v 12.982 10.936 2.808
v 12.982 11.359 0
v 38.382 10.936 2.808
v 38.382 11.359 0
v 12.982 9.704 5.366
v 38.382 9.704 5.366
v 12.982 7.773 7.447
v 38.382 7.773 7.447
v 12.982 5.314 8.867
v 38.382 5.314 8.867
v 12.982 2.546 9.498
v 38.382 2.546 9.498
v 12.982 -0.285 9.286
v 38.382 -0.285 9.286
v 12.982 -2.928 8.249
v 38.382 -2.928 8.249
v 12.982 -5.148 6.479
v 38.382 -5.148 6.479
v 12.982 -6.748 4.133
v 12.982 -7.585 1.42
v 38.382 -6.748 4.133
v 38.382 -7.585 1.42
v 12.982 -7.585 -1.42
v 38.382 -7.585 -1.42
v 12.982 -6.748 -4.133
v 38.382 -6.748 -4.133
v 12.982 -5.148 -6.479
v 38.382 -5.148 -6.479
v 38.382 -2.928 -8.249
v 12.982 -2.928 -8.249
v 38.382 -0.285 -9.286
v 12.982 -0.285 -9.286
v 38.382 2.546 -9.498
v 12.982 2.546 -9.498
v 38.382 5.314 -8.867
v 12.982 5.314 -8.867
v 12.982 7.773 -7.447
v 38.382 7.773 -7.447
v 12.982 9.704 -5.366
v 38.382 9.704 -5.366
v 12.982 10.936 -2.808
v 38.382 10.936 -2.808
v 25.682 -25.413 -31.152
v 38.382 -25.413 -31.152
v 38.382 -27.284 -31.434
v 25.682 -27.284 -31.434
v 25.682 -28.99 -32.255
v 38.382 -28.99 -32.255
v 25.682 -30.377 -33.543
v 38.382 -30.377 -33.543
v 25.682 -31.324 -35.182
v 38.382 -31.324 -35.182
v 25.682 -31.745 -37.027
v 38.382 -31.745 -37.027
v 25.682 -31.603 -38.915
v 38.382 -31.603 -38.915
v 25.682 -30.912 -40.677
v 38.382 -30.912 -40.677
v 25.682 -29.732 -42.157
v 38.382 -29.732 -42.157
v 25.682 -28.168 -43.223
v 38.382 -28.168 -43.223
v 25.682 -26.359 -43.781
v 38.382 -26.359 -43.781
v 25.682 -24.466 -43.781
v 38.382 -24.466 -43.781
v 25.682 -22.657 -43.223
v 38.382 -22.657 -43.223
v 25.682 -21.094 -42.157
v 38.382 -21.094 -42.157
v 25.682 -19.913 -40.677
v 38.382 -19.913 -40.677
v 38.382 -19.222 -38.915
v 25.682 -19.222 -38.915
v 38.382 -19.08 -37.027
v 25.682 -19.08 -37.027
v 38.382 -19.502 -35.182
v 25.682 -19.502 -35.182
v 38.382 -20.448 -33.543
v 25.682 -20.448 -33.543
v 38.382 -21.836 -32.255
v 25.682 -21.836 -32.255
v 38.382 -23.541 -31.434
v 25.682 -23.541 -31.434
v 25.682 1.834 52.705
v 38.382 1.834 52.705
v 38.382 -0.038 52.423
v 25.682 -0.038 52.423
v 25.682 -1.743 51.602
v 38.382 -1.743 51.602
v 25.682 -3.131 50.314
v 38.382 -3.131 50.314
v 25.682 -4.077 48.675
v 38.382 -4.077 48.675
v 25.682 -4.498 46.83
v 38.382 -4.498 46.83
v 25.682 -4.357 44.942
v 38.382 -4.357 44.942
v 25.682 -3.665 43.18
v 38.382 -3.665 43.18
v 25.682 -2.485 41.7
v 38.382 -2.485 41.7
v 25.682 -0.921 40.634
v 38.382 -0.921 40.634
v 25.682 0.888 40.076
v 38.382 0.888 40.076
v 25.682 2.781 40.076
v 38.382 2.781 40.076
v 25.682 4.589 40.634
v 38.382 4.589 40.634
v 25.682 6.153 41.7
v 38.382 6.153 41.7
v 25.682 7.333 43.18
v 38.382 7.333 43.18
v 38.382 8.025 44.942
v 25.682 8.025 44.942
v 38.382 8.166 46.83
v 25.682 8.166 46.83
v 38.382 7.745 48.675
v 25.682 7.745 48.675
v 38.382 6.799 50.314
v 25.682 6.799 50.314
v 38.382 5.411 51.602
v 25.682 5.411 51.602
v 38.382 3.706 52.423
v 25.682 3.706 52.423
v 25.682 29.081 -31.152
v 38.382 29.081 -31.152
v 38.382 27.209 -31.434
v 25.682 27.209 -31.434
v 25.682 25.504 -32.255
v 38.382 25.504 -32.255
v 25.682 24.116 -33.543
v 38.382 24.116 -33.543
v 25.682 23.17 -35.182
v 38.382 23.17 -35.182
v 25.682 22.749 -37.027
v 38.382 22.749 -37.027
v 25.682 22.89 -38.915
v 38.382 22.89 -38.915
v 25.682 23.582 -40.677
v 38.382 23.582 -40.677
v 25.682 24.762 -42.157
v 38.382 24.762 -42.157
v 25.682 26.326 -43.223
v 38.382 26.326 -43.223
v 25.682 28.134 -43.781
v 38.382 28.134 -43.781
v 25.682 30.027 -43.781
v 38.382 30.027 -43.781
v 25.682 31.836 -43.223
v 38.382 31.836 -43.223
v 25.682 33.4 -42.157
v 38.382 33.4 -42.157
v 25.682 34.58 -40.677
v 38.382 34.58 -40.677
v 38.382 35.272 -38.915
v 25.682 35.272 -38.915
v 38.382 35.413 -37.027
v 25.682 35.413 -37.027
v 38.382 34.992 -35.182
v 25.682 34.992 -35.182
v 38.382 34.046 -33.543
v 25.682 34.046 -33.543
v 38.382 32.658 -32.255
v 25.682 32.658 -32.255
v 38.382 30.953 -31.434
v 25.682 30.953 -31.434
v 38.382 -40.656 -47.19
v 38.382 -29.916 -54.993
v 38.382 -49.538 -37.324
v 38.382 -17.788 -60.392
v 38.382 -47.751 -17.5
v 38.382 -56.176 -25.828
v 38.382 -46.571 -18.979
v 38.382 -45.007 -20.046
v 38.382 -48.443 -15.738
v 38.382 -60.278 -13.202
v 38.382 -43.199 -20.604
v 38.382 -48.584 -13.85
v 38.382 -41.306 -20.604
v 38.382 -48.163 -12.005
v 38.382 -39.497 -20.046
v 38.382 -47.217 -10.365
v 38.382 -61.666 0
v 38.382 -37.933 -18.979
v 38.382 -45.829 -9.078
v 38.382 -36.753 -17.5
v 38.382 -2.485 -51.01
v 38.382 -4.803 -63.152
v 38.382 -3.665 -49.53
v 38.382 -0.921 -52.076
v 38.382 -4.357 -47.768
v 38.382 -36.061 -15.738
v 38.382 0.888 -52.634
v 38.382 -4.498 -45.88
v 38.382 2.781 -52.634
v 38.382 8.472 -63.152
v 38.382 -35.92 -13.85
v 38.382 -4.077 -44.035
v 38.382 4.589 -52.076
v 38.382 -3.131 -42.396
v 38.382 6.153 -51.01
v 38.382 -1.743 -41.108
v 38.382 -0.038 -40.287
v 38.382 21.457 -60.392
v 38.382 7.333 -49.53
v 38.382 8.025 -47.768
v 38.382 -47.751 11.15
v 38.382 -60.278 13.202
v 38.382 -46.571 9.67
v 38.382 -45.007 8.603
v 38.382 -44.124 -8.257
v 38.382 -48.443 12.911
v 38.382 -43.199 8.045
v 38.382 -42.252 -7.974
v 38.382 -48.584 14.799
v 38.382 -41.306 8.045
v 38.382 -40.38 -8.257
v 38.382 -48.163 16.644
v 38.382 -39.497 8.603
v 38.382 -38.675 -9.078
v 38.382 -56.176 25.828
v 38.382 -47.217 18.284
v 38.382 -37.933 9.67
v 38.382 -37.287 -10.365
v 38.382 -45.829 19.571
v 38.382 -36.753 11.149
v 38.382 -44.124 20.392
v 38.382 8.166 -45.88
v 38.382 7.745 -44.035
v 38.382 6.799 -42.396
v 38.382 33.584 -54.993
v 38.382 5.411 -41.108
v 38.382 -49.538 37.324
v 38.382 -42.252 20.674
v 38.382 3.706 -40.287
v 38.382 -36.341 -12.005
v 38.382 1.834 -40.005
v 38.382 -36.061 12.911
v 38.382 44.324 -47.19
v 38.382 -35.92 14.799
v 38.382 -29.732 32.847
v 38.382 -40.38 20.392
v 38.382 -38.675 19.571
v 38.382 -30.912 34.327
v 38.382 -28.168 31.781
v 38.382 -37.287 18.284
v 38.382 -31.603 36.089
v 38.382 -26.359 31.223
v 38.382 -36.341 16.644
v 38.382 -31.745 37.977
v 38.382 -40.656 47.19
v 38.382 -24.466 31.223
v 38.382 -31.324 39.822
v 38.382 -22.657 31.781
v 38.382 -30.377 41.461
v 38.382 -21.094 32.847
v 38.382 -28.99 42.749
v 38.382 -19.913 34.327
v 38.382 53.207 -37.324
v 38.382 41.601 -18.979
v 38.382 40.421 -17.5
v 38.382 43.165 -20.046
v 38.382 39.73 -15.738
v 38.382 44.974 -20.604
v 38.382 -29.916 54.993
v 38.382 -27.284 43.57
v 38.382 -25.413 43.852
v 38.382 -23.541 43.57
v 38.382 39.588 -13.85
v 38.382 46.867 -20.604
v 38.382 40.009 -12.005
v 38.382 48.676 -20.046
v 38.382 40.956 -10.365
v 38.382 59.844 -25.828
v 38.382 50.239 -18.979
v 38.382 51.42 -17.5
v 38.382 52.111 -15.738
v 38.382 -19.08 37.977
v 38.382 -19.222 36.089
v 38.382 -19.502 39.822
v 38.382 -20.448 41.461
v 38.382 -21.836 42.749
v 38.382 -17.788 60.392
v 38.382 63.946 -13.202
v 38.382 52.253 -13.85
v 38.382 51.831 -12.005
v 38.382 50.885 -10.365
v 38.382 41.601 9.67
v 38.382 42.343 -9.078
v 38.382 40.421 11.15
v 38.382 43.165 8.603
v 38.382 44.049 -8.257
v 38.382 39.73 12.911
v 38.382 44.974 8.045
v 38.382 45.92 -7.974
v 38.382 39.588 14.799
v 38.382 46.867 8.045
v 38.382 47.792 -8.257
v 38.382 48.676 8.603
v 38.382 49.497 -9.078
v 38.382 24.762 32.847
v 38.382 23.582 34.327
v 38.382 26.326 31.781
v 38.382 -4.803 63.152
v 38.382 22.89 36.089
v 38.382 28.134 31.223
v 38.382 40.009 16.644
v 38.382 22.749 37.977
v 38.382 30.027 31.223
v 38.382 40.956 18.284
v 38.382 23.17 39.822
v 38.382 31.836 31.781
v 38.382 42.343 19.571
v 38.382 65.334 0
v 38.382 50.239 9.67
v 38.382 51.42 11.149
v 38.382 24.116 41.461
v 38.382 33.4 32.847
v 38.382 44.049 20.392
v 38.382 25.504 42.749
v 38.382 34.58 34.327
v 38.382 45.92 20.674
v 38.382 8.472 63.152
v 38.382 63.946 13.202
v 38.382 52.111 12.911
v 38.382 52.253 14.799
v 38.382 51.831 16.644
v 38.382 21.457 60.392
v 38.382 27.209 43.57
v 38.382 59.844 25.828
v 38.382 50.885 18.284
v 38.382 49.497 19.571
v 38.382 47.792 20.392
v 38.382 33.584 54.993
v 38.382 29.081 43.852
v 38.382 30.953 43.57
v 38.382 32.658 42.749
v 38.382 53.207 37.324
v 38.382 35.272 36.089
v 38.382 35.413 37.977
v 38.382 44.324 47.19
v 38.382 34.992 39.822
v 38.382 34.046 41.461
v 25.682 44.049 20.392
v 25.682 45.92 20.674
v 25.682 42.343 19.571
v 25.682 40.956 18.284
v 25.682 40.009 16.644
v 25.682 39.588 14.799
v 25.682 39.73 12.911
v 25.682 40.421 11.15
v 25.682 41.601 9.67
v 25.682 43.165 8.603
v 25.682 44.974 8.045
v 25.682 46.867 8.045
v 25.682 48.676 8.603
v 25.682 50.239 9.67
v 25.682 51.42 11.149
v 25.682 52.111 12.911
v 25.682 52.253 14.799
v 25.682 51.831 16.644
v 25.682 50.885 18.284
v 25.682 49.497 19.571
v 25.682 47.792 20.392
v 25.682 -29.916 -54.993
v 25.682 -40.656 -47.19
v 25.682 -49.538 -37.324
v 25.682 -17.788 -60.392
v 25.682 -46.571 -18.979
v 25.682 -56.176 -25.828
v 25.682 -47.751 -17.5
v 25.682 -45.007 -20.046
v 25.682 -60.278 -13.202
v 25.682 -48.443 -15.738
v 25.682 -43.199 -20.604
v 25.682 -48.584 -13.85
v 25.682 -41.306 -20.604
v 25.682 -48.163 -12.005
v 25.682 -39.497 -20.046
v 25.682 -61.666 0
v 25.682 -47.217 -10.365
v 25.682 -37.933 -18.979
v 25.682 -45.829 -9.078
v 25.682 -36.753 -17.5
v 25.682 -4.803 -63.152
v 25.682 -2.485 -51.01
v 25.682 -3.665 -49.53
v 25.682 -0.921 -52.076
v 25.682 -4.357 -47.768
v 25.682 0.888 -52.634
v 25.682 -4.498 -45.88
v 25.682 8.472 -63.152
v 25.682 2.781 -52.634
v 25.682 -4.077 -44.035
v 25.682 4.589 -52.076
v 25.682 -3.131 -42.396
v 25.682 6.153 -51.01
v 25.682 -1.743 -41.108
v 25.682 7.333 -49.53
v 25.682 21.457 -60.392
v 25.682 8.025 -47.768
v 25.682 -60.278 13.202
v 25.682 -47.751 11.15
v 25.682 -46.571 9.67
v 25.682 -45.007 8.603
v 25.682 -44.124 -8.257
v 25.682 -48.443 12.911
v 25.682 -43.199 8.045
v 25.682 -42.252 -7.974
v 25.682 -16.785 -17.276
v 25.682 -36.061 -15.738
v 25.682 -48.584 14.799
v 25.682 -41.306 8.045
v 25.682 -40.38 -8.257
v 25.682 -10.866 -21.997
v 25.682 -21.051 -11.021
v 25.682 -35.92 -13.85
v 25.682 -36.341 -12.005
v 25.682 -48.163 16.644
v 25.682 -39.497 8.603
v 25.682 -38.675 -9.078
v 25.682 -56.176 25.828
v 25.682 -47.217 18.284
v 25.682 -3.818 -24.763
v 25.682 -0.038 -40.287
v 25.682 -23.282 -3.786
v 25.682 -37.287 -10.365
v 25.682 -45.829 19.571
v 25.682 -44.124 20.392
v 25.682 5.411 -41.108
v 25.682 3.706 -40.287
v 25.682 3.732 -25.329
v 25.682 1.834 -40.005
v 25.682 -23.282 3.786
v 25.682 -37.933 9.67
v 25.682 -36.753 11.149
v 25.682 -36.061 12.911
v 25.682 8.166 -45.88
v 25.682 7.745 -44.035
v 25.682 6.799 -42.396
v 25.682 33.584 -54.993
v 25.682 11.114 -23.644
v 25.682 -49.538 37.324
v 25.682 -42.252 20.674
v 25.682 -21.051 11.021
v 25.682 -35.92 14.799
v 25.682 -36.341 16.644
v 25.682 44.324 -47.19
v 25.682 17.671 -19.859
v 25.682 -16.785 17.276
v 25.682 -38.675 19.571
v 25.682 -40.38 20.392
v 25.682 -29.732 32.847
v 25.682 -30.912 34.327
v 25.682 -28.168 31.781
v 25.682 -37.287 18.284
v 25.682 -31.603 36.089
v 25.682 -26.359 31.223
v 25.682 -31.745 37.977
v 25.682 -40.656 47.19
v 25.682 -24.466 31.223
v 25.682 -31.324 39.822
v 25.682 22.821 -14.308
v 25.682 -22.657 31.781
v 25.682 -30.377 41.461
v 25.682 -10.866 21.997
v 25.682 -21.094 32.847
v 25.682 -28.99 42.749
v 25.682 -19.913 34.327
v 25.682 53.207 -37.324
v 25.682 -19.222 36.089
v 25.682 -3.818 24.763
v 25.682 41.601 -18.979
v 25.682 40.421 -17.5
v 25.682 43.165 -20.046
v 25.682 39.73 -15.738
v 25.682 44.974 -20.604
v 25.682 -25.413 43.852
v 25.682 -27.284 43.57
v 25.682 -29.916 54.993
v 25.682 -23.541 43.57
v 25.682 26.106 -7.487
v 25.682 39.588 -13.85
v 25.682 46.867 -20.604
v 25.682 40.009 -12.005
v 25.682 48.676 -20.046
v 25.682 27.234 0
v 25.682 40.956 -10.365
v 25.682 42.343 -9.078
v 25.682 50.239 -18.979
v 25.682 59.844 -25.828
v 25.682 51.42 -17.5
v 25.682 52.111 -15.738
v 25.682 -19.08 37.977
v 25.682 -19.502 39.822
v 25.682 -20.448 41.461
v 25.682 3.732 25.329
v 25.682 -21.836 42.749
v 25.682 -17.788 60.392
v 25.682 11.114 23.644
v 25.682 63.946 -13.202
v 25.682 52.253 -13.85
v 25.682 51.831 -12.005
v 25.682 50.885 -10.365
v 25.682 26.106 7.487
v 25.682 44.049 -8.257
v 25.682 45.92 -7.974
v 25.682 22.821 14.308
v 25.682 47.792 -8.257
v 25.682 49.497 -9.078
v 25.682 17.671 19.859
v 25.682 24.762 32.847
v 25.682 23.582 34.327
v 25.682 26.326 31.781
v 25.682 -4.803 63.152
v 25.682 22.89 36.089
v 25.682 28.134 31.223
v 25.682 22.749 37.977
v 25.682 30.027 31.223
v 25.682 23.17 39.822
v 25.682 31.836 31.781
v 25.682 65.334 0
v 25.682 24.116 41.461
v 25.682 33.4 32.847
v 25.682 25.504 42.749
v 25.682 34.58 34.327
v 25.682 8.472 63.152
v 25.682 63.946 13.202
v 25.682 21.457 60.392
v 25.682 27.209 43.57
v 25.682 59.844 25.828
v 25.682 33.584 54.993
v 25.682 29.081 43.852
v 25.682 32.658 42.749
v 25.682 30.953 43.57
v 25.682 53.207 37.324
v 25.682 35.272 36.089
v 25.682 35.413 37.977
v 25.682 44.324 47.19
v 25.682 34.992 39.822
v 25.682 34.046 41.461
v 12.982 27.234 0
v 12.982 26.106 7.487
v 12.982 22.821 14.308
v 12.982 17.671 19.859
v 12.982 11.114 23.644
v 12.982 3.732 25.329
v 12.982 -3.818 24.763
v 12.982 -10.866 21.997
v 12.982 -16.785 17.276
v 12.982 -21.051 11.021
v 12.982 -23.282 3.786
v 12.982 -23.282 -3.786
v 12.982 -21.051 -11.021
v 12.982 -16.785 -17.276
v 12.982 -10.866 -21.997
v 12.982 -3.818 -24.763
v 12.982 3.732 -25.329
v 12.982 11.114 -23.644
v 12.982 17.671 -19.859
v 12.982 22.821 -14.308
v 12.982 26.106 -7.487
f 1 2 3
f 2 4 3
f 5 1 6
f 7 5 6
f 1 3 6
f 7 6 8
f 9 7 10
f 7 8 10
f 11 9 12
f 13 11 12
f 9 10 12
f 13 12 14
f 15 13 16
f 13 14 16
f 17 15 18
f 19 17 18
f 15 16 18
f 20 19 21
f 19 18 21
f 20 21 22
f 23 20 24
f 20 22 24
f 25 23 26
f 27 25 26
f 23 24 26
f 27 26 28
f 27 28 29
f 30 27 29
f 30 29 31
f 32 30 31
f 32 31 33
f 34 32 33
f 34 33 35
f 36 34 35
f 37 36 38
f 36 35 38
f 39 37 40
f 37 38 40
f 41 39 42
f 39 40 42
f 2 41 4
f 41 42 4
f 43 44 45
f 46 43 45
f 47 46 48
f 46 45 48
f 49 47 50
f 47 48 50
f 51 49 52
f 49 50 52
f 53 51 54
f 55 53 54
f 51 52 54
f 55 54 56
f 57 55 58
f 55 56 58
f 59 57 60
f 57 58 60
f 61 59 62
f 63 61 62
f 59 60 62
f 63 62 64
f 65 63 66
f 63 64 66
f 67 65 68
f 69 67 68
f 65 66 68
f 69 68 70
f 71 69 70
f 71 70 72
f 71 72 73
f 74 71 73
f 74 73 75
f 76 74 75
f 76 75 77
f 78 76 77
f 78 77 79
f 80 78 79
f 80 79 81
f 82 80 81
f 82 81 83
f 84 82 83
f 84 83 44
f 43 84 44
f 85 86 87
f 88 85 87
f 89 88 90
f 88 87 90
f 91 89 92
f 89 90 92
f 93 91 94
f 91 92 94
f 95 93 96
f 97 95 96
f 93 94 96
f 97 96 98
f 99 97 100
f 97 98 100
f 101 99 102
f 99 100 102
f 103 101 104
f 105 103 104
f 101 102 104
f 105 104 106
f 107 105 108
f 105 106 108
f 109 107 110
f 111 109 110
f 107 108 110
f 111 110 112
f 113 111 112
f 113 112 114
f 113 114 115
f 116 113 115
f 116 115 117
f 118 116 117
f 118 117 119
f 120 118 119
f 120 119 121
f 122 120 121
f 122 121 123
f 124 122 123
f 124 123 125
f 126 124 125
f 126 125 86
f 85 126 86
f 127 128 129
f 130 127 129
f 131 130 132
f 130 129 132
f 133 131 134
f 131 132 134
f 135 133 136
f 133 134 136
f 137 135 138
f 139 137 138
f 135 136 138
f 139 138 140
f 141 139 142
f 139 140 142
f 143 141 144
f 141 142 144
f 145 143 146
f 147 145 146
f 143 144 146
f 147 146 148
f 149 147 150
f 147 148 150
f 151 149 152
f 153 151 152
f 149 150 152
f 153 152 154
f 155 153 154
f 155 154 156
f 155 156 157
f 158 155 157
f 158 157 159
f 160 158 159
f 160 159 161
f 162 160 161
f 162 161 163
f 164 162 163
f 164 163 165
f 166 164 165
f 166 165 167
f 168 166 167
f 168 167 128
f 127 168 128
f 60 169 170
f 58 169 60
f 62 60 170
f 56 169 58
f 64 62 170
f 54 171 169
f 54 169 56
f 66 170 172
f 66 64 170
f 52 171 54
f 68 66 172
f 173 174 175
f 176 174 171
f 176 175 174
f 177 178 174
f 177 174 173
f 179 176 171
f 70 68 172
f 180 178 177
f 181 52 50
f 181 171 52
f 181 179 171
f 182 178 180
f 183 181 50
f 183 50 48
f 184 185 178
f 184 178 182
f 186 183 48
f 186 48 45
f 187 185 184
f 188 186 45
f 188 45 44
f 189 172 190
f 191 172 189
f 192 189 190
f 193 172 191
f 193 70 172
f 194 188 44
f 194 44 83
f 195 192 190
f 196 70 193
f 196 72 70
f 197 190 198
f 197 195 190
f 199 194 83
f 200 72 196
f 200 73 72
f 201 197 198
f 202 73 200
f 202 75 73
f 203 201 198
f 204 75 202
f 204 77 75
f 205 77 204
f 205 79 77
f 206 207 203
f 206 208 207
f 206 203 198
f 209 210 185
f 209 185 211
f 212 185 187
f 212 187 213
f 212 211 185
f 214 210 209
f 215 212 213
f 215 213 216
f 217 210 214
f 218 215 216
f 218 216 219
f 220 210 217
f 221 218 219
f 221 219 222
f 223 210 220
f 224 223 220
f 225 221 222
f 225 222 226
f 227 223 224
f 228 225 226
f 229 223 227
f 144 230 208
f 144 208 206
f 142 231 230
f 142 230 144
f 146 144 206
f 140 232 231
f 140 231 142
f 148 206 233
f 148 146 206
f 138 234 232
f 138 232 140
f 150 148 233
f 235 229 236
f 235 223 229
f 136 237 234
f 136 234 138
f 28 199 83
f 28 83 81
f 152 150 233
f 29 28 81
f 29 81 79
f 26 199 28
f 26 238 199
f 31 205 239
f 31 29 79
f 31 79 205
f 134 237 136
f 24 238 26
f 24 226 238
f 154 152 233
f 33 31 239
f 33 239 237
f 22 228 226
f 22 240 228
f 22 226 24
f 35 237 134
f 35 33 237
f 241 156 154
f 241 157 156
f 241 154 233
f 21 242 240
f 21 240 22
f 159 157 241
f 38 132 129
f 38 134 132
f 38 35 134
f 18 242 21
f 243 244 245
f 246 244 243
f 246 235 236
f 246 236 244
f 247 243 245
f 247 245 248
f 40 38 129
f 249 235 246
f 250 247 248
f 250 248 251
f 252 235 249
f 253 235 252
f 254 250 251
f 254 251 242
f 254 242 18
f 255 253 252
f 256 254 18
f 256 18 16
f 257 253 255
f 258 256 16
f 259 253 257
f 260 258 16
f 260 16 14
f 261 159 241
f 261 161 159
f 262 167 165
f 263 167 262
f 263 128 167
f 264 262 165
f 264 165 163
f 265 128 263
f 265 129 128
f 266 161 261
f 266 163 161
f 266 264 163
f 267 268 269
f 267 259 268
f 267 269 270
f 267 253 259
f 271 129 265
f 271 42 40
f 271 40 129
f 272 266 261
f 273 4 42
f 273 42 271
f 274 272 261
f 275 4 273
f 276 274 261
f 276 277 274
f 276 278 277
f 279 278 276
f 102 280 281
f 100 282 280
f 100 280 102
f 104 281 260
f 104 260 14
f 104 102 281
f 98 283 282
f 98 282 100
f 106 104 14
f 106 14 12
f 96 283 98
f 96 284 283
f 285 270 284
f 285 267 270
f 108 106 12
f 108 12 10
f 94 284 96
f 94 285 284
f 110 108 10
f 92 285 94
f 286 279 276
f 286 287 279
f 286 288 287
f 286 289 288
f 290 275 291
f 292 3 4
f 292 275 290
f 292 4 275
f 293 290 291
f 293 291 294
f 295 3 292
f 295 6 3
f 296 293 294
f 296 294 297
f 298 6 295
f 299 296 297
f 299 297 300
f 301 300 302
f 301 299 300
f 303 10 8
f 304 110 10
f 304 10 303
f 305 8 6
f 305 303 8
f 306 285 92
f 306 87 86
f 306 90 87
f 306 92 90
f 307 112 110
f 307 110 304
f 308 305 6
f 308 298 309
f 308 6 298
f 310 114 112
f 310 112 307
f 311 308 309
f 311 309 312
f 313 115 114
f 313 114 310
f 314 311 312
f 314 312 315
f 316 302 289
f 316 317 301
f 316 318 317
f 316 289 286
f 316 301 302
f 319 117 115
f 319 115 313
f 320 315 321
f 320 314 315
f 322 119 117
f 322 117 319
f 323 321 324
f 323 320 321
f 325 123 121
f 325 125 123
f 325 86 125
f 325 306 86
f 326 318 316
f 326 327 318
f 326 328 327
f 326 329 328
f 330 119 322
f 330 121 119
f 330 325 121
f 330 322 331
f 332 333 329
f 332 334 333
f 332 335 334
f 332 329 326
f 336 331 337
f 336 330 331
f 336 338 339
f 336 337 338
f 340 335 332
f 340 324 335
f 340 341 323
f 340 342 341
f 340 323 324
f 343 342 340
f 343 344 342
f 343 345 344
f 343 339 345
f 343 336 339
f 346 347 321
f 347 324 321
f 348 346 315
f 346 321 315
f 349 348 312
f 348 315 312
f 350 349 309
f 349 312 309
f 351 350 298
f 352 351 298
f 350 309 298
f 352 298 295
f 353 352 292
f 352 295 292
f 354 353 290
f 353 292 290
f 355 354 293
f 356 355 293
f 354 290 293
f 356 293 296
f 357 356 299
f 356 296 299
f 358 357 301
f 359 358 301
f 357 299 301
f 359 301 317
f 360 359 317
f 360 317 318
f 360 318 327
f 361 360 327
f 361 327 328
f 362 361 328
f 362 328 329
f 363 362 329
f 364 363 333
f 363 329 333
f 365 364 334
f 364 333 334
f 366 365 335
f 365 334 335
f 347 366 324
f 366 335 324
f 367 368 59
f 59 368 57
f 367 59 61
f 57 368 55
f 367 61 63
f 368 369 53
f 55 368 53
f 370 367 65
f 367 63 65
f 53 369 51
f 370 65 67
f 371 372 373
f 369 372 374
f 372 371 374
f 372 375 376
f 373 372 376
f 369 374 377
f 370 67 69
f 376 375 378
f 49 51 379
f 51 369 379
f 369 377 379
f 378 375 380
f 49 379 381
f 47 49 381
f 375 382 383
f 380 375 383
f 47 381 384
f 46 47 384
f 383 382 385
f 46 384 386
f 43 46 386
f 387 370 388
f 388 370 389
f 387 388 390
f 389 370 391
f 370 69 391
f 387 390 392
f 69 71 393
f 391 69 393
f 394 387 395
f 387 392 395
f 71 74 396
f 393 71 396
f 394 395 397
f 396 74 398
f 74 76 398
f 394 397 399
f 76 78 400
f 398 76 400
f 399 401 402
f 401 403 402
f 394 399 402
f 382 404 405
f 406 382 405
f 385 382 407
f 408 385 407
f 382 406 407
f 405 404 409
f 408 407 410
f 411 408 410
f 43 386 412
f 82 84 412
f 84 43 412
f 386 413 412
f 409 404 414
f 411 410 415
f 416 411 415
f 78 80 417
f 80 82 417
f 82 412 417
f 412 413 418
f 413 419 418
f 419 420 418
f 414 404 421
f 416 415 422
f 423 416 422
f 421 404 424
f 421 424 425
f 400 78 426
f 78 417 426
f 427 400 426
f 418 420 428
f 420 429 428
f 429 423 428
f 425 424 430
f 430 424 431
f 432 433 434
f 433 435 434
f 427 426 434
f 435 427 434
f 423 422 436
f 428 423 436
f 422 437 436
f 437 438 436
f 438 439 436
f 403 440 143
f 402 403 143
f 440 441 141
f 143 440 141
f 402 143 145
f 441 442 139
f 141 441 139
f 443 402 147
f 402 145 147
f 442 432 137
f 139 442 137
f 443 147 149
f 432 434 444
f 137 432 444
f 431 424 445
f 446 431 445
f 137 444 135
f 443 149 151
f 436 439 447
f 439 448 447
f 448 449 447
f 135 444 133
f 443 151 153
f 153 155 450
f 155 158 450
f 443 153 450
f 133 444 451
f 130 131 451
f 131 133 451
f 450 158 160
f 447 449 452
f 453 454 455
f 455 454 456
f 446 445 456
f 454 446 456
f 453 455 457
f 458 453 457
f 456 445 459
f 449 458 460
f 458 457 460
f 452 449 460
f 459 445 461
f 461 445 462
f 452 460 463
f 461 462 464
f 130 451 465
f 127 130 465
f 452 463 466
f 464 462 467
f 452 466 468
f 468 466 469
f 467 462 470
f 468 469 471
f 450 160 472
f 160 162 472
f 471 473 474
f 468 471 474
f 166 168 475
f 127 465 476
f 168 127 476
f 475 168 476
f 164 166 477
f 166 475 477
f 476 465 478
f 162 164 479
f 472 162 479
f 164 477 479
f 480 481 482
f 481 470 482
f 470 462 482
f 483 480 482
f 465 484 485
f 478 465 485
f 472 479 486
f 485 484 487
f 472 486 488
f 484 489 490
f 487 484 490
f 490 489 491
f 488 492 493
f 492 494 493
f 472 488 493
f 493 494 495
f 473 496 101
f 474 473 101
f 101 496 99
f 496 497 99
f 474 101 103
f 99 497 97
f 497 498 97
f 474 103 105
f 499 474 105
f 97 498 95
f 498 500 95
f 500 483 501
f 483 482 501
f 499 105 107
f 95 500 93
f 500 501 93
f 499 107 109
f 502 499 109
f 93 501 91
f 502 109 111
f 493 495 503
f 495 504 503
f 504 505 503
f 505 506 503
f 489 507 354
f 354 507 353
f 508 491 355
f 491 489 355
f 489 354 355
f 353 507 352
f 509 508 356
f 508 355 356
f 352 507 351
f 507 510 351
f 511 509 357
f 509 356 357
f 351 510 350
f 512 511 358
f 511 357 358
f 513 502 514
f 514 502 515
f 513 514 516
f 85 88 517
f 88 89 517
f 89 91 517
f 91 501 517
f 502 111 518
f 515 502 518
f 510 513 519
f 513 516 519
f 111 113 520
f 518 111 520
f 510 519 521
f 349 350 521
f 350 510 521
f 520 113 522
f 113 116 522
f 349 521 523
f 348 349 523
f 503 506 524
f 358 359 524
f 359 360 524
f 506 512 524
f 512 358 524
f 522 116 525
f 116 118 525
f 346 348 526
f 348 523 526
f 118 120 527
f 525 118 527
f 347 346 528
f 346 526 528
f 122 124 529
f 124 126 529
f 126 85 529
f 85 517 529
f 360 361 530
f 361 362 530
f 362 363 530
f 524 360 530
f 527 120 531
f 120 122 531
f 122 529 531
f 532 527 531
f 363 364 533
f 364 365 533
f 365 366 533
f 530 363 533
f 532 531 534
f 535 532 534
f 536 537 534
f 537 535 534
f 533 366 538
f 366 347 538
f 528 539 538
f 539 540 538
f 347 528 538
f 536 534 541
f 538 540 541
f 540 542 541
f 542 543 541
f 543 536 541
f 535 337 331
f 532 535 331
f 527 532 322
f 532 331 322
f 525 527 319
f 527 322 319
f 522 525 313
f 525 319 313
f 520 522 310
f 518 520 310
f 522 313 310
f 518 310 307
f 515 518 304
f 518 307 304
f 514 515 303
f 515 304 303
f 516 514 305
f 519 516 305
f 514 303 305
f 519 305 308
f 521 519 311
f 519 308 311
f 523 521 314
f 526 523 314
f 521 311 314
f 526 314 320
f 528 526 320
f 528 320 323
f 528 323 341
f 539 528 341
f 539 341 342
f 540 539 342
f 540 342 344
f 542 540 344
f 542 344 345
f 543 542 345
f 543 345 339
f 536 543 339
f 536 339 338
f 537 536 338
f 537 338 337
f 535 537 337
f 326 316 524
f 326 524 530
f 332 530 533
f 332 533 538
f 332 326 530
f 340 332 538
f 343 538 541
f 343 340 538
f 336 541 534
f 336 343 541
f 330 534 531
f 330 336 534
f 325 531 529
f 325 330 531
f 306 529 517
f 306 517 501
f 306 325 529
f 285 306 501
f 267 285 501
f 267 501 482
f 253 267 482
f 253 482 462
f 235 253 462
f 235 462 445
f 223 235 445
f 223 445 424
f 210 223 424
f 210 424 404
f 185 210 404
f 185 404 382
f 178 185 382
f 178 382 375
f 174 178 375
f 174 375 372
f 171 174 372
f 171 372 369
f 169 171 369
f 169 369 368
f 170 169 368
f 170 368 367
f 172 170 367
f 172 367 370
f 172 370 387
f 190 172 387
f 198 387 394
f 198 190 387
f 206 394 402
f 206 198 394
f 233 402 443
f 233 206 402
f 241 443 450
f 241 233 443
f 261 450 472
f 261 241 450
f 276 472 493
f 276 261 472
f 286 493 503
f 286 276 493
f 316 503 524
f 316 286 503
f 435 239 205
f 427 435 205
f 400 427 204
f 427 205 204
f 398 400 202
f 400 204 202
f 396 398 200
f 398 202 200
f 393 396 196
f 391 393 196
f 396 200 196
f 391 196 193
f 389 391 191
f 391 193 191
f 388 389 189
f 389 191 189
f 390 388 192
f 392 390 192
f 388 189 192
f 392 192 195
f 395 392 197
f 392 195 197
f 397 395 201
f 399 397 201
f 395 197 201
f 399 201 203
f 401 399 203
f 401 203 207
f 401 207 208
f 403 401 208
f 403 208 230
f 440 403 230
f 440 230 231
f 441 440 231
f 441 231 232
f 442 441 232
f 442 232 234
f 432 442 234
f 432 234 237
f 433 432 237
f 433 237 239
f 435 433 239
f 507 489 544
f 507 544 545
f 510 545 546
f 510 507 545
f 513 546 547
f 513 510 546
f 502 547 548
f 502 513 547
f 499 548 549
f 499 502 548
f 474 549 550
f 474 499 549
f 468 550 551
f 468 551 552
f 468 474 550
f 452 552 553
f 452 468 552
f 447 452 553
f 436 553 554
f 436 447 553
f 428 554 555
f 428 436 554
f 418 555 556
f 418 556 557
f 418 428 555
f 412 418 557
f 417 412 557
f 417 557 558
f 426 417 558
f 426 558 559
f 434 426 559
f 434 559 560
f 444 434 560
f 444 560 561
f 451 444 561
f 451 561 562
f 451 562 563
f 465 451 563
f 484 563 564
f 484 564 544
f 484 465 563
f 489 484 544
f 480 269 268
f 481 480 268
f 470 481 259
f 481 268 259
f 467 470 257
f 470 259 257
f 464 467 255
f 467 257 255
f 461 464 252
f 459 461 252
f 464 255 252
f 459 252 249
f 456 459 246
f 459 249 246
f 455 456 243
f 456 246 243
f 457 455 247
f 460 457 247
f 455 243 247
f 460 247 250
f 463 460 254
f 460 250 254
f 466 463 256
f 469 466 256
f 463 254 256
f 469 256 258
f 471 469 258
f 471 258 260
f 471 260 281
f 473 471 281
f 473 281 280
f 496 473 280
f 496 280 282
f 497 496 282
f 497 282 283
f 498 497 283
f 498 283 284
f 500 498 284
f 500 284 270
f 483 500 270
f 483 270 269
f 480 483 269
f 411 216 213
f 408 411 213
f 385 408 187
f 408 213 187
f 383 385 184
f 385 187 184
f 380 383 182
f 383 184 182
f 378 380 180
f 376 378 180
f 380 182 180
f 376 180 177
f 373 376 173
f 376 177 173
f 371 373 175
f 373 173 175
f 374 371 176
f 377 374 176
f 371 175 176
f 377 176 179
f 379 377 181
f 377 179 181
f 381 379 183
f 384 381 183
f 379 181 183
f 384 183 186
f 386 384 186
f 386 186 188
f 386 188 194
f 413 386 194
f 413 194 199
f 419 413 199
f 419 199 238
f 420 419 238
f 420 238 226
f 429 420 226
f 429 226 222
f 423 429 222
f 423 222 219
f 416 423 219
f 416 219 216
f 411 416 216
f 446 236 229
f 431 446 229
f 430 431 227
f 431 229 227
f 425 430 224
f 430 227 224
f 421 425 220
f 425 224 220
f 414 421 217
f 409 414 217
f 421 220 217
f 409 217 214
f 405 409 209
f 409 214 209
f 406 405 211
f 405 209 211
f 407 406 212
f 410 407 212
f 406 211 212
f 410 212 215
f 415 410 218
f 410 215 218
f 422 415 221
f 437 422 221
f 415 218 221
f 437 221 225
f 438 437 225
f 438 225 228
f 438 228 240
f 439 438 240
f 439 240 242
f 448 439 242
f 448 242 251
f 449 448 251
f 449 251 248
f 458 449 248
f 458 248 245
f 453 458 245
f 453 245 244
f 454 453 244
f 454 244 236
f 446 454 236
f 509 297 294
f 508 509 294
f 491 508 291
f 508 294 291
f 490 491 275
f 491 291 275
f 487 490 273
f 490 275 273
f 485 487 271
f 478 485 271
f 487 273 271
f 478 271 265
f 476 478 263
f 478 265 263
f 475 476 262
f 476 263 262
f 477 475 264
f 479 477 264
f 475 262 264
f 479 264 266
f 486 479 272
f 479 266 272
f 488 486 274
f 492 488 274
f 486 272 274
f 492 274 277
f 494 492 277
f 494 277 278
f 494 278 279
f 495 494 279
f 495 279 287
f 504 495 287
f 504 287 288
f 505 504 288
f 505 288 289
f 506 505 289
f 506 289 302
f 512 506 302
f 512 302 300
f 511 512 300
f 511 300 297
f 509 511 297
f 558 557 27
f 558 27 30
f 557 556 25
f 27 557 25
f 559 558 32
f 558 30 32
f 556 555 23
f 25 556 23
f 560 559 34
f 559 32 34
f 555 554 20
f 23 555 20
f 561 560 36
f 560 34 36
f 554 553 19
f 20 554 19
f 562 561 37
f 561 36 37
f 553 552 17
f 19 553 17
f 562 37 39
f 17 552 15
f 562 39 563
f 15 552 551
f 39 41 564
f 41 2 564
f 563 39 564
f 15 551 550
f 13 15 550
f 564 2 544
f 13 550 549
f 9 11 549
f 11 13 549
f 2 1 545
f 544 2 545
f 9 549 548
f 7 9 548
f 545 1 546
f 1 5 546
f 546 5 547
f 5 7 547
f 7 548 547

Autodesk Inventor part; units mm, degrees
ref_plane "YZ Plane" through (0, 0, 0) normal (1, 0, 0) x (0, 1, 0)
ref_plane "XZ Plane" through (0, 0, 0) normal (0, 1, 0) x (-1, 0, 0)
ref_plane "XY Plane" through (0, 0, 0) normal (0, 0, 1) x (1, 0, 0)
sketch "Sketch1" plane through (0, 0, 0) normal (0, 0, 1) x (1, 0, 0)
  line L0 (12.9819, 11.3591) -> (38.3819, 11.3591)
  line L1 (6.6182, 1.8341) -> (45.5002, 1.8341) construction
  line L2 (12.9819, 11.3591) -> (12.9819, 27.2341)
  line L3 (12.9819, 27.2341) -> (25.6819, 27.2341)
  line L4 (25.6819, 27.2341) -> (25.6819, 65.3341)
  line L5 (25.6819, 65.3341) -> (38.3819, 65.3341)
  line L6 (38.3819, 65.3341) -> (38.3819, 11.3591)
  point P0 (0, 0)
  dimension "d0" = 25.4
  dimension "d1" = 9.525
  dimension "d2" = 15.875
  dimension "d3" = 12.7
  dimension "d4" = 38.1
revolve "Revolution2" add sketch "Sketch1" angle 360 about axis through (6.6182, 1.8341, 0) along (1, 0, 0)
sketch "Sketch7" plane through (25.6819, 1.8341, 0) normal (-1, 0, 0) x (0, 0, 1)
  circle A0 centre (0, 0) radius 46.355 construction
  circle A1 centre (0, 0) radius 46.355 construction
  circle A2 centre (0, 0) radius 46.355 construction
  circle A3 centre (0, 0) radius 46.355 construction
  circle A4 centre (0, 0) radius 46.355 construction
  circle A5 centre (0, 0) radius 46.355 construction
  circle A6 centre (0, 0) radius 46.355 construction
  circle A7 centre (0, 0) radius 46.355 construction
  circle A8 centre (0, 0) radius 46.355 construction
  circle A9 centre (0, 0) radius 46.355 construction
  point P0 (0, -1.8341)
  point P1 (-46.355, 0)
  point P2 (-37.502, -27.2468)
  point P3 (-14.3245, -44.0862)
  point P4 (14.3245, -44.0862)
  point P5 (37.502, -27.2468)
  point P6 (46.355, 0)
  point P7 (37.502, 27.2468)
  point P8 (14.3245, 44.0862)
  point P9 (-14.3245, 44.0862)
  point P10 (-37.502, 27.2468)
  dimension "d14" = 92.71
  dimension "d17" = 360
hole "Hole2" at (25.6819, 1.8341, -46.355) at (25.6819, -25.4126, -37.502) at (25.6819, -42.2521, -14.3245) at (25.6819, -42.2521, 14.3245) at (25.6819, -25.4126, 37.502) at (25.6819, 1.8341, 46.355) at (25.6819, 29.0809, 37.502) at (25.6819, 45.9204, 14.3245) at (25.6819, 45.9204, -14.3245) at (25.6819, 29.0809, -37.502) direction (1, 0, 0) diameter 12.7 end through all
properties part number "WheelcapTL"
